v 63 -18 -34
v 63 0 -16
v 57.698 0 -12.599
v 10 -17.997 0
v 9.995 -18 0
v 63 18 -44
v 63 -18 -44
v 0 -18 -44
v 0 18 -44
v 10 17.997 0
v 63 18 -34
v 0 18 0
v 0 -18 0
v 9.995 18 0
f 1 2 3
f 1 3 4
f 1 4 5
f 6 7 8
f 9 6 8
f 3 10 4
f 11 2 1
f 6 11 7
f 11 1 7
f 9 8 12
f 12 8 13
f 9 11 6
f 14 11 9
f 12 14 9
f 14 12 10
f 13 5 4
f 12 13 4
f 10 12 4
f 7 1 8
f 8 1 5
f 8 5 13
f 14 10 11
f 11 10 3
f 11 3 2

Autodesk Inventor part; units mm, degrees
ref_plane "YZ Plane" through (0, 0, 0) normal (1, 0, 0) x (0, 1, 0)
ref_plane "XZ Plane" through (0, 0, 0) normal (0, 1, 0) x (-1, 0, 0)
sketch "草圖1" plane through (0, 0, 0) normal (0, 1, 0) x (-1, 0, 0)
  line L0 (0, 0) -> (-63, 0)
  line L1 (-63, 0) -> (-63, -44)
  line L2 (-63, -44) -> (0, -44)
  line L3 (0, -44) -> (0, 0)
  dimension "d0" = 63
  dimension "d1" = 44
extrude "擠出1" add sketch "草圖1" along normal mid plane 36
sketch "草圖2" plane through (0, 18, 0) normal (0, 1, 0) x (1, 0, 0)
  line L0 (0, 0) -> (63, 0) projected
  line L1 (10, 0) -> (63, 14)
  line L2 (63, 0) -> (63, 44) projected
  dimension "d4" = 10
  dimension "d5" = 30
extrude "擠出2" cut sketch "草圖2" against normal blind 40
sketch "草圖3" plane through (63, -18, -44) normal (1, 0, 0) x (0, 0, -1)
  line L0 (-30, 16) -> (-10, 36)
  line L1 (0, 36) -> (-44, 36) projected
  line L2 (-30, 36) -> (-30, 0) projected
  point P0 (-44, 18)
  dimension "d8" = 20
  dimension "d9" = 20
ref_plane "工作平面1" through (10, 18, 0) normal (-0.4131, -0.644, -0.644) x (0.8417, 0, -0.54)
sketch "草圖4" plane through (10, 18, 0) normal (-0.4131, -0.644, -0.644) x (0.8417, 0, -0.54)
  line L0 (-15.1543, -12.3218) -> (93.717, -12.3218)
  line L1 (93.717, -12.3218) -> (93.717, 28.8166)
  line L2 (93.717, 28.8166) -> (-15.1543, 28.8166)
  line L3 (-15.1543, 28.8166) -> (-15.1543, -12.3218)
  point P0 (-8.4169, 10.2941)
extrude "擠出3" cut sketch "草圖4" against normal blind 40
mirror "鏡射1" about plane through (0, 0, 0) normal (0, 1, 0) of "擠出3"
properties part number "24"
